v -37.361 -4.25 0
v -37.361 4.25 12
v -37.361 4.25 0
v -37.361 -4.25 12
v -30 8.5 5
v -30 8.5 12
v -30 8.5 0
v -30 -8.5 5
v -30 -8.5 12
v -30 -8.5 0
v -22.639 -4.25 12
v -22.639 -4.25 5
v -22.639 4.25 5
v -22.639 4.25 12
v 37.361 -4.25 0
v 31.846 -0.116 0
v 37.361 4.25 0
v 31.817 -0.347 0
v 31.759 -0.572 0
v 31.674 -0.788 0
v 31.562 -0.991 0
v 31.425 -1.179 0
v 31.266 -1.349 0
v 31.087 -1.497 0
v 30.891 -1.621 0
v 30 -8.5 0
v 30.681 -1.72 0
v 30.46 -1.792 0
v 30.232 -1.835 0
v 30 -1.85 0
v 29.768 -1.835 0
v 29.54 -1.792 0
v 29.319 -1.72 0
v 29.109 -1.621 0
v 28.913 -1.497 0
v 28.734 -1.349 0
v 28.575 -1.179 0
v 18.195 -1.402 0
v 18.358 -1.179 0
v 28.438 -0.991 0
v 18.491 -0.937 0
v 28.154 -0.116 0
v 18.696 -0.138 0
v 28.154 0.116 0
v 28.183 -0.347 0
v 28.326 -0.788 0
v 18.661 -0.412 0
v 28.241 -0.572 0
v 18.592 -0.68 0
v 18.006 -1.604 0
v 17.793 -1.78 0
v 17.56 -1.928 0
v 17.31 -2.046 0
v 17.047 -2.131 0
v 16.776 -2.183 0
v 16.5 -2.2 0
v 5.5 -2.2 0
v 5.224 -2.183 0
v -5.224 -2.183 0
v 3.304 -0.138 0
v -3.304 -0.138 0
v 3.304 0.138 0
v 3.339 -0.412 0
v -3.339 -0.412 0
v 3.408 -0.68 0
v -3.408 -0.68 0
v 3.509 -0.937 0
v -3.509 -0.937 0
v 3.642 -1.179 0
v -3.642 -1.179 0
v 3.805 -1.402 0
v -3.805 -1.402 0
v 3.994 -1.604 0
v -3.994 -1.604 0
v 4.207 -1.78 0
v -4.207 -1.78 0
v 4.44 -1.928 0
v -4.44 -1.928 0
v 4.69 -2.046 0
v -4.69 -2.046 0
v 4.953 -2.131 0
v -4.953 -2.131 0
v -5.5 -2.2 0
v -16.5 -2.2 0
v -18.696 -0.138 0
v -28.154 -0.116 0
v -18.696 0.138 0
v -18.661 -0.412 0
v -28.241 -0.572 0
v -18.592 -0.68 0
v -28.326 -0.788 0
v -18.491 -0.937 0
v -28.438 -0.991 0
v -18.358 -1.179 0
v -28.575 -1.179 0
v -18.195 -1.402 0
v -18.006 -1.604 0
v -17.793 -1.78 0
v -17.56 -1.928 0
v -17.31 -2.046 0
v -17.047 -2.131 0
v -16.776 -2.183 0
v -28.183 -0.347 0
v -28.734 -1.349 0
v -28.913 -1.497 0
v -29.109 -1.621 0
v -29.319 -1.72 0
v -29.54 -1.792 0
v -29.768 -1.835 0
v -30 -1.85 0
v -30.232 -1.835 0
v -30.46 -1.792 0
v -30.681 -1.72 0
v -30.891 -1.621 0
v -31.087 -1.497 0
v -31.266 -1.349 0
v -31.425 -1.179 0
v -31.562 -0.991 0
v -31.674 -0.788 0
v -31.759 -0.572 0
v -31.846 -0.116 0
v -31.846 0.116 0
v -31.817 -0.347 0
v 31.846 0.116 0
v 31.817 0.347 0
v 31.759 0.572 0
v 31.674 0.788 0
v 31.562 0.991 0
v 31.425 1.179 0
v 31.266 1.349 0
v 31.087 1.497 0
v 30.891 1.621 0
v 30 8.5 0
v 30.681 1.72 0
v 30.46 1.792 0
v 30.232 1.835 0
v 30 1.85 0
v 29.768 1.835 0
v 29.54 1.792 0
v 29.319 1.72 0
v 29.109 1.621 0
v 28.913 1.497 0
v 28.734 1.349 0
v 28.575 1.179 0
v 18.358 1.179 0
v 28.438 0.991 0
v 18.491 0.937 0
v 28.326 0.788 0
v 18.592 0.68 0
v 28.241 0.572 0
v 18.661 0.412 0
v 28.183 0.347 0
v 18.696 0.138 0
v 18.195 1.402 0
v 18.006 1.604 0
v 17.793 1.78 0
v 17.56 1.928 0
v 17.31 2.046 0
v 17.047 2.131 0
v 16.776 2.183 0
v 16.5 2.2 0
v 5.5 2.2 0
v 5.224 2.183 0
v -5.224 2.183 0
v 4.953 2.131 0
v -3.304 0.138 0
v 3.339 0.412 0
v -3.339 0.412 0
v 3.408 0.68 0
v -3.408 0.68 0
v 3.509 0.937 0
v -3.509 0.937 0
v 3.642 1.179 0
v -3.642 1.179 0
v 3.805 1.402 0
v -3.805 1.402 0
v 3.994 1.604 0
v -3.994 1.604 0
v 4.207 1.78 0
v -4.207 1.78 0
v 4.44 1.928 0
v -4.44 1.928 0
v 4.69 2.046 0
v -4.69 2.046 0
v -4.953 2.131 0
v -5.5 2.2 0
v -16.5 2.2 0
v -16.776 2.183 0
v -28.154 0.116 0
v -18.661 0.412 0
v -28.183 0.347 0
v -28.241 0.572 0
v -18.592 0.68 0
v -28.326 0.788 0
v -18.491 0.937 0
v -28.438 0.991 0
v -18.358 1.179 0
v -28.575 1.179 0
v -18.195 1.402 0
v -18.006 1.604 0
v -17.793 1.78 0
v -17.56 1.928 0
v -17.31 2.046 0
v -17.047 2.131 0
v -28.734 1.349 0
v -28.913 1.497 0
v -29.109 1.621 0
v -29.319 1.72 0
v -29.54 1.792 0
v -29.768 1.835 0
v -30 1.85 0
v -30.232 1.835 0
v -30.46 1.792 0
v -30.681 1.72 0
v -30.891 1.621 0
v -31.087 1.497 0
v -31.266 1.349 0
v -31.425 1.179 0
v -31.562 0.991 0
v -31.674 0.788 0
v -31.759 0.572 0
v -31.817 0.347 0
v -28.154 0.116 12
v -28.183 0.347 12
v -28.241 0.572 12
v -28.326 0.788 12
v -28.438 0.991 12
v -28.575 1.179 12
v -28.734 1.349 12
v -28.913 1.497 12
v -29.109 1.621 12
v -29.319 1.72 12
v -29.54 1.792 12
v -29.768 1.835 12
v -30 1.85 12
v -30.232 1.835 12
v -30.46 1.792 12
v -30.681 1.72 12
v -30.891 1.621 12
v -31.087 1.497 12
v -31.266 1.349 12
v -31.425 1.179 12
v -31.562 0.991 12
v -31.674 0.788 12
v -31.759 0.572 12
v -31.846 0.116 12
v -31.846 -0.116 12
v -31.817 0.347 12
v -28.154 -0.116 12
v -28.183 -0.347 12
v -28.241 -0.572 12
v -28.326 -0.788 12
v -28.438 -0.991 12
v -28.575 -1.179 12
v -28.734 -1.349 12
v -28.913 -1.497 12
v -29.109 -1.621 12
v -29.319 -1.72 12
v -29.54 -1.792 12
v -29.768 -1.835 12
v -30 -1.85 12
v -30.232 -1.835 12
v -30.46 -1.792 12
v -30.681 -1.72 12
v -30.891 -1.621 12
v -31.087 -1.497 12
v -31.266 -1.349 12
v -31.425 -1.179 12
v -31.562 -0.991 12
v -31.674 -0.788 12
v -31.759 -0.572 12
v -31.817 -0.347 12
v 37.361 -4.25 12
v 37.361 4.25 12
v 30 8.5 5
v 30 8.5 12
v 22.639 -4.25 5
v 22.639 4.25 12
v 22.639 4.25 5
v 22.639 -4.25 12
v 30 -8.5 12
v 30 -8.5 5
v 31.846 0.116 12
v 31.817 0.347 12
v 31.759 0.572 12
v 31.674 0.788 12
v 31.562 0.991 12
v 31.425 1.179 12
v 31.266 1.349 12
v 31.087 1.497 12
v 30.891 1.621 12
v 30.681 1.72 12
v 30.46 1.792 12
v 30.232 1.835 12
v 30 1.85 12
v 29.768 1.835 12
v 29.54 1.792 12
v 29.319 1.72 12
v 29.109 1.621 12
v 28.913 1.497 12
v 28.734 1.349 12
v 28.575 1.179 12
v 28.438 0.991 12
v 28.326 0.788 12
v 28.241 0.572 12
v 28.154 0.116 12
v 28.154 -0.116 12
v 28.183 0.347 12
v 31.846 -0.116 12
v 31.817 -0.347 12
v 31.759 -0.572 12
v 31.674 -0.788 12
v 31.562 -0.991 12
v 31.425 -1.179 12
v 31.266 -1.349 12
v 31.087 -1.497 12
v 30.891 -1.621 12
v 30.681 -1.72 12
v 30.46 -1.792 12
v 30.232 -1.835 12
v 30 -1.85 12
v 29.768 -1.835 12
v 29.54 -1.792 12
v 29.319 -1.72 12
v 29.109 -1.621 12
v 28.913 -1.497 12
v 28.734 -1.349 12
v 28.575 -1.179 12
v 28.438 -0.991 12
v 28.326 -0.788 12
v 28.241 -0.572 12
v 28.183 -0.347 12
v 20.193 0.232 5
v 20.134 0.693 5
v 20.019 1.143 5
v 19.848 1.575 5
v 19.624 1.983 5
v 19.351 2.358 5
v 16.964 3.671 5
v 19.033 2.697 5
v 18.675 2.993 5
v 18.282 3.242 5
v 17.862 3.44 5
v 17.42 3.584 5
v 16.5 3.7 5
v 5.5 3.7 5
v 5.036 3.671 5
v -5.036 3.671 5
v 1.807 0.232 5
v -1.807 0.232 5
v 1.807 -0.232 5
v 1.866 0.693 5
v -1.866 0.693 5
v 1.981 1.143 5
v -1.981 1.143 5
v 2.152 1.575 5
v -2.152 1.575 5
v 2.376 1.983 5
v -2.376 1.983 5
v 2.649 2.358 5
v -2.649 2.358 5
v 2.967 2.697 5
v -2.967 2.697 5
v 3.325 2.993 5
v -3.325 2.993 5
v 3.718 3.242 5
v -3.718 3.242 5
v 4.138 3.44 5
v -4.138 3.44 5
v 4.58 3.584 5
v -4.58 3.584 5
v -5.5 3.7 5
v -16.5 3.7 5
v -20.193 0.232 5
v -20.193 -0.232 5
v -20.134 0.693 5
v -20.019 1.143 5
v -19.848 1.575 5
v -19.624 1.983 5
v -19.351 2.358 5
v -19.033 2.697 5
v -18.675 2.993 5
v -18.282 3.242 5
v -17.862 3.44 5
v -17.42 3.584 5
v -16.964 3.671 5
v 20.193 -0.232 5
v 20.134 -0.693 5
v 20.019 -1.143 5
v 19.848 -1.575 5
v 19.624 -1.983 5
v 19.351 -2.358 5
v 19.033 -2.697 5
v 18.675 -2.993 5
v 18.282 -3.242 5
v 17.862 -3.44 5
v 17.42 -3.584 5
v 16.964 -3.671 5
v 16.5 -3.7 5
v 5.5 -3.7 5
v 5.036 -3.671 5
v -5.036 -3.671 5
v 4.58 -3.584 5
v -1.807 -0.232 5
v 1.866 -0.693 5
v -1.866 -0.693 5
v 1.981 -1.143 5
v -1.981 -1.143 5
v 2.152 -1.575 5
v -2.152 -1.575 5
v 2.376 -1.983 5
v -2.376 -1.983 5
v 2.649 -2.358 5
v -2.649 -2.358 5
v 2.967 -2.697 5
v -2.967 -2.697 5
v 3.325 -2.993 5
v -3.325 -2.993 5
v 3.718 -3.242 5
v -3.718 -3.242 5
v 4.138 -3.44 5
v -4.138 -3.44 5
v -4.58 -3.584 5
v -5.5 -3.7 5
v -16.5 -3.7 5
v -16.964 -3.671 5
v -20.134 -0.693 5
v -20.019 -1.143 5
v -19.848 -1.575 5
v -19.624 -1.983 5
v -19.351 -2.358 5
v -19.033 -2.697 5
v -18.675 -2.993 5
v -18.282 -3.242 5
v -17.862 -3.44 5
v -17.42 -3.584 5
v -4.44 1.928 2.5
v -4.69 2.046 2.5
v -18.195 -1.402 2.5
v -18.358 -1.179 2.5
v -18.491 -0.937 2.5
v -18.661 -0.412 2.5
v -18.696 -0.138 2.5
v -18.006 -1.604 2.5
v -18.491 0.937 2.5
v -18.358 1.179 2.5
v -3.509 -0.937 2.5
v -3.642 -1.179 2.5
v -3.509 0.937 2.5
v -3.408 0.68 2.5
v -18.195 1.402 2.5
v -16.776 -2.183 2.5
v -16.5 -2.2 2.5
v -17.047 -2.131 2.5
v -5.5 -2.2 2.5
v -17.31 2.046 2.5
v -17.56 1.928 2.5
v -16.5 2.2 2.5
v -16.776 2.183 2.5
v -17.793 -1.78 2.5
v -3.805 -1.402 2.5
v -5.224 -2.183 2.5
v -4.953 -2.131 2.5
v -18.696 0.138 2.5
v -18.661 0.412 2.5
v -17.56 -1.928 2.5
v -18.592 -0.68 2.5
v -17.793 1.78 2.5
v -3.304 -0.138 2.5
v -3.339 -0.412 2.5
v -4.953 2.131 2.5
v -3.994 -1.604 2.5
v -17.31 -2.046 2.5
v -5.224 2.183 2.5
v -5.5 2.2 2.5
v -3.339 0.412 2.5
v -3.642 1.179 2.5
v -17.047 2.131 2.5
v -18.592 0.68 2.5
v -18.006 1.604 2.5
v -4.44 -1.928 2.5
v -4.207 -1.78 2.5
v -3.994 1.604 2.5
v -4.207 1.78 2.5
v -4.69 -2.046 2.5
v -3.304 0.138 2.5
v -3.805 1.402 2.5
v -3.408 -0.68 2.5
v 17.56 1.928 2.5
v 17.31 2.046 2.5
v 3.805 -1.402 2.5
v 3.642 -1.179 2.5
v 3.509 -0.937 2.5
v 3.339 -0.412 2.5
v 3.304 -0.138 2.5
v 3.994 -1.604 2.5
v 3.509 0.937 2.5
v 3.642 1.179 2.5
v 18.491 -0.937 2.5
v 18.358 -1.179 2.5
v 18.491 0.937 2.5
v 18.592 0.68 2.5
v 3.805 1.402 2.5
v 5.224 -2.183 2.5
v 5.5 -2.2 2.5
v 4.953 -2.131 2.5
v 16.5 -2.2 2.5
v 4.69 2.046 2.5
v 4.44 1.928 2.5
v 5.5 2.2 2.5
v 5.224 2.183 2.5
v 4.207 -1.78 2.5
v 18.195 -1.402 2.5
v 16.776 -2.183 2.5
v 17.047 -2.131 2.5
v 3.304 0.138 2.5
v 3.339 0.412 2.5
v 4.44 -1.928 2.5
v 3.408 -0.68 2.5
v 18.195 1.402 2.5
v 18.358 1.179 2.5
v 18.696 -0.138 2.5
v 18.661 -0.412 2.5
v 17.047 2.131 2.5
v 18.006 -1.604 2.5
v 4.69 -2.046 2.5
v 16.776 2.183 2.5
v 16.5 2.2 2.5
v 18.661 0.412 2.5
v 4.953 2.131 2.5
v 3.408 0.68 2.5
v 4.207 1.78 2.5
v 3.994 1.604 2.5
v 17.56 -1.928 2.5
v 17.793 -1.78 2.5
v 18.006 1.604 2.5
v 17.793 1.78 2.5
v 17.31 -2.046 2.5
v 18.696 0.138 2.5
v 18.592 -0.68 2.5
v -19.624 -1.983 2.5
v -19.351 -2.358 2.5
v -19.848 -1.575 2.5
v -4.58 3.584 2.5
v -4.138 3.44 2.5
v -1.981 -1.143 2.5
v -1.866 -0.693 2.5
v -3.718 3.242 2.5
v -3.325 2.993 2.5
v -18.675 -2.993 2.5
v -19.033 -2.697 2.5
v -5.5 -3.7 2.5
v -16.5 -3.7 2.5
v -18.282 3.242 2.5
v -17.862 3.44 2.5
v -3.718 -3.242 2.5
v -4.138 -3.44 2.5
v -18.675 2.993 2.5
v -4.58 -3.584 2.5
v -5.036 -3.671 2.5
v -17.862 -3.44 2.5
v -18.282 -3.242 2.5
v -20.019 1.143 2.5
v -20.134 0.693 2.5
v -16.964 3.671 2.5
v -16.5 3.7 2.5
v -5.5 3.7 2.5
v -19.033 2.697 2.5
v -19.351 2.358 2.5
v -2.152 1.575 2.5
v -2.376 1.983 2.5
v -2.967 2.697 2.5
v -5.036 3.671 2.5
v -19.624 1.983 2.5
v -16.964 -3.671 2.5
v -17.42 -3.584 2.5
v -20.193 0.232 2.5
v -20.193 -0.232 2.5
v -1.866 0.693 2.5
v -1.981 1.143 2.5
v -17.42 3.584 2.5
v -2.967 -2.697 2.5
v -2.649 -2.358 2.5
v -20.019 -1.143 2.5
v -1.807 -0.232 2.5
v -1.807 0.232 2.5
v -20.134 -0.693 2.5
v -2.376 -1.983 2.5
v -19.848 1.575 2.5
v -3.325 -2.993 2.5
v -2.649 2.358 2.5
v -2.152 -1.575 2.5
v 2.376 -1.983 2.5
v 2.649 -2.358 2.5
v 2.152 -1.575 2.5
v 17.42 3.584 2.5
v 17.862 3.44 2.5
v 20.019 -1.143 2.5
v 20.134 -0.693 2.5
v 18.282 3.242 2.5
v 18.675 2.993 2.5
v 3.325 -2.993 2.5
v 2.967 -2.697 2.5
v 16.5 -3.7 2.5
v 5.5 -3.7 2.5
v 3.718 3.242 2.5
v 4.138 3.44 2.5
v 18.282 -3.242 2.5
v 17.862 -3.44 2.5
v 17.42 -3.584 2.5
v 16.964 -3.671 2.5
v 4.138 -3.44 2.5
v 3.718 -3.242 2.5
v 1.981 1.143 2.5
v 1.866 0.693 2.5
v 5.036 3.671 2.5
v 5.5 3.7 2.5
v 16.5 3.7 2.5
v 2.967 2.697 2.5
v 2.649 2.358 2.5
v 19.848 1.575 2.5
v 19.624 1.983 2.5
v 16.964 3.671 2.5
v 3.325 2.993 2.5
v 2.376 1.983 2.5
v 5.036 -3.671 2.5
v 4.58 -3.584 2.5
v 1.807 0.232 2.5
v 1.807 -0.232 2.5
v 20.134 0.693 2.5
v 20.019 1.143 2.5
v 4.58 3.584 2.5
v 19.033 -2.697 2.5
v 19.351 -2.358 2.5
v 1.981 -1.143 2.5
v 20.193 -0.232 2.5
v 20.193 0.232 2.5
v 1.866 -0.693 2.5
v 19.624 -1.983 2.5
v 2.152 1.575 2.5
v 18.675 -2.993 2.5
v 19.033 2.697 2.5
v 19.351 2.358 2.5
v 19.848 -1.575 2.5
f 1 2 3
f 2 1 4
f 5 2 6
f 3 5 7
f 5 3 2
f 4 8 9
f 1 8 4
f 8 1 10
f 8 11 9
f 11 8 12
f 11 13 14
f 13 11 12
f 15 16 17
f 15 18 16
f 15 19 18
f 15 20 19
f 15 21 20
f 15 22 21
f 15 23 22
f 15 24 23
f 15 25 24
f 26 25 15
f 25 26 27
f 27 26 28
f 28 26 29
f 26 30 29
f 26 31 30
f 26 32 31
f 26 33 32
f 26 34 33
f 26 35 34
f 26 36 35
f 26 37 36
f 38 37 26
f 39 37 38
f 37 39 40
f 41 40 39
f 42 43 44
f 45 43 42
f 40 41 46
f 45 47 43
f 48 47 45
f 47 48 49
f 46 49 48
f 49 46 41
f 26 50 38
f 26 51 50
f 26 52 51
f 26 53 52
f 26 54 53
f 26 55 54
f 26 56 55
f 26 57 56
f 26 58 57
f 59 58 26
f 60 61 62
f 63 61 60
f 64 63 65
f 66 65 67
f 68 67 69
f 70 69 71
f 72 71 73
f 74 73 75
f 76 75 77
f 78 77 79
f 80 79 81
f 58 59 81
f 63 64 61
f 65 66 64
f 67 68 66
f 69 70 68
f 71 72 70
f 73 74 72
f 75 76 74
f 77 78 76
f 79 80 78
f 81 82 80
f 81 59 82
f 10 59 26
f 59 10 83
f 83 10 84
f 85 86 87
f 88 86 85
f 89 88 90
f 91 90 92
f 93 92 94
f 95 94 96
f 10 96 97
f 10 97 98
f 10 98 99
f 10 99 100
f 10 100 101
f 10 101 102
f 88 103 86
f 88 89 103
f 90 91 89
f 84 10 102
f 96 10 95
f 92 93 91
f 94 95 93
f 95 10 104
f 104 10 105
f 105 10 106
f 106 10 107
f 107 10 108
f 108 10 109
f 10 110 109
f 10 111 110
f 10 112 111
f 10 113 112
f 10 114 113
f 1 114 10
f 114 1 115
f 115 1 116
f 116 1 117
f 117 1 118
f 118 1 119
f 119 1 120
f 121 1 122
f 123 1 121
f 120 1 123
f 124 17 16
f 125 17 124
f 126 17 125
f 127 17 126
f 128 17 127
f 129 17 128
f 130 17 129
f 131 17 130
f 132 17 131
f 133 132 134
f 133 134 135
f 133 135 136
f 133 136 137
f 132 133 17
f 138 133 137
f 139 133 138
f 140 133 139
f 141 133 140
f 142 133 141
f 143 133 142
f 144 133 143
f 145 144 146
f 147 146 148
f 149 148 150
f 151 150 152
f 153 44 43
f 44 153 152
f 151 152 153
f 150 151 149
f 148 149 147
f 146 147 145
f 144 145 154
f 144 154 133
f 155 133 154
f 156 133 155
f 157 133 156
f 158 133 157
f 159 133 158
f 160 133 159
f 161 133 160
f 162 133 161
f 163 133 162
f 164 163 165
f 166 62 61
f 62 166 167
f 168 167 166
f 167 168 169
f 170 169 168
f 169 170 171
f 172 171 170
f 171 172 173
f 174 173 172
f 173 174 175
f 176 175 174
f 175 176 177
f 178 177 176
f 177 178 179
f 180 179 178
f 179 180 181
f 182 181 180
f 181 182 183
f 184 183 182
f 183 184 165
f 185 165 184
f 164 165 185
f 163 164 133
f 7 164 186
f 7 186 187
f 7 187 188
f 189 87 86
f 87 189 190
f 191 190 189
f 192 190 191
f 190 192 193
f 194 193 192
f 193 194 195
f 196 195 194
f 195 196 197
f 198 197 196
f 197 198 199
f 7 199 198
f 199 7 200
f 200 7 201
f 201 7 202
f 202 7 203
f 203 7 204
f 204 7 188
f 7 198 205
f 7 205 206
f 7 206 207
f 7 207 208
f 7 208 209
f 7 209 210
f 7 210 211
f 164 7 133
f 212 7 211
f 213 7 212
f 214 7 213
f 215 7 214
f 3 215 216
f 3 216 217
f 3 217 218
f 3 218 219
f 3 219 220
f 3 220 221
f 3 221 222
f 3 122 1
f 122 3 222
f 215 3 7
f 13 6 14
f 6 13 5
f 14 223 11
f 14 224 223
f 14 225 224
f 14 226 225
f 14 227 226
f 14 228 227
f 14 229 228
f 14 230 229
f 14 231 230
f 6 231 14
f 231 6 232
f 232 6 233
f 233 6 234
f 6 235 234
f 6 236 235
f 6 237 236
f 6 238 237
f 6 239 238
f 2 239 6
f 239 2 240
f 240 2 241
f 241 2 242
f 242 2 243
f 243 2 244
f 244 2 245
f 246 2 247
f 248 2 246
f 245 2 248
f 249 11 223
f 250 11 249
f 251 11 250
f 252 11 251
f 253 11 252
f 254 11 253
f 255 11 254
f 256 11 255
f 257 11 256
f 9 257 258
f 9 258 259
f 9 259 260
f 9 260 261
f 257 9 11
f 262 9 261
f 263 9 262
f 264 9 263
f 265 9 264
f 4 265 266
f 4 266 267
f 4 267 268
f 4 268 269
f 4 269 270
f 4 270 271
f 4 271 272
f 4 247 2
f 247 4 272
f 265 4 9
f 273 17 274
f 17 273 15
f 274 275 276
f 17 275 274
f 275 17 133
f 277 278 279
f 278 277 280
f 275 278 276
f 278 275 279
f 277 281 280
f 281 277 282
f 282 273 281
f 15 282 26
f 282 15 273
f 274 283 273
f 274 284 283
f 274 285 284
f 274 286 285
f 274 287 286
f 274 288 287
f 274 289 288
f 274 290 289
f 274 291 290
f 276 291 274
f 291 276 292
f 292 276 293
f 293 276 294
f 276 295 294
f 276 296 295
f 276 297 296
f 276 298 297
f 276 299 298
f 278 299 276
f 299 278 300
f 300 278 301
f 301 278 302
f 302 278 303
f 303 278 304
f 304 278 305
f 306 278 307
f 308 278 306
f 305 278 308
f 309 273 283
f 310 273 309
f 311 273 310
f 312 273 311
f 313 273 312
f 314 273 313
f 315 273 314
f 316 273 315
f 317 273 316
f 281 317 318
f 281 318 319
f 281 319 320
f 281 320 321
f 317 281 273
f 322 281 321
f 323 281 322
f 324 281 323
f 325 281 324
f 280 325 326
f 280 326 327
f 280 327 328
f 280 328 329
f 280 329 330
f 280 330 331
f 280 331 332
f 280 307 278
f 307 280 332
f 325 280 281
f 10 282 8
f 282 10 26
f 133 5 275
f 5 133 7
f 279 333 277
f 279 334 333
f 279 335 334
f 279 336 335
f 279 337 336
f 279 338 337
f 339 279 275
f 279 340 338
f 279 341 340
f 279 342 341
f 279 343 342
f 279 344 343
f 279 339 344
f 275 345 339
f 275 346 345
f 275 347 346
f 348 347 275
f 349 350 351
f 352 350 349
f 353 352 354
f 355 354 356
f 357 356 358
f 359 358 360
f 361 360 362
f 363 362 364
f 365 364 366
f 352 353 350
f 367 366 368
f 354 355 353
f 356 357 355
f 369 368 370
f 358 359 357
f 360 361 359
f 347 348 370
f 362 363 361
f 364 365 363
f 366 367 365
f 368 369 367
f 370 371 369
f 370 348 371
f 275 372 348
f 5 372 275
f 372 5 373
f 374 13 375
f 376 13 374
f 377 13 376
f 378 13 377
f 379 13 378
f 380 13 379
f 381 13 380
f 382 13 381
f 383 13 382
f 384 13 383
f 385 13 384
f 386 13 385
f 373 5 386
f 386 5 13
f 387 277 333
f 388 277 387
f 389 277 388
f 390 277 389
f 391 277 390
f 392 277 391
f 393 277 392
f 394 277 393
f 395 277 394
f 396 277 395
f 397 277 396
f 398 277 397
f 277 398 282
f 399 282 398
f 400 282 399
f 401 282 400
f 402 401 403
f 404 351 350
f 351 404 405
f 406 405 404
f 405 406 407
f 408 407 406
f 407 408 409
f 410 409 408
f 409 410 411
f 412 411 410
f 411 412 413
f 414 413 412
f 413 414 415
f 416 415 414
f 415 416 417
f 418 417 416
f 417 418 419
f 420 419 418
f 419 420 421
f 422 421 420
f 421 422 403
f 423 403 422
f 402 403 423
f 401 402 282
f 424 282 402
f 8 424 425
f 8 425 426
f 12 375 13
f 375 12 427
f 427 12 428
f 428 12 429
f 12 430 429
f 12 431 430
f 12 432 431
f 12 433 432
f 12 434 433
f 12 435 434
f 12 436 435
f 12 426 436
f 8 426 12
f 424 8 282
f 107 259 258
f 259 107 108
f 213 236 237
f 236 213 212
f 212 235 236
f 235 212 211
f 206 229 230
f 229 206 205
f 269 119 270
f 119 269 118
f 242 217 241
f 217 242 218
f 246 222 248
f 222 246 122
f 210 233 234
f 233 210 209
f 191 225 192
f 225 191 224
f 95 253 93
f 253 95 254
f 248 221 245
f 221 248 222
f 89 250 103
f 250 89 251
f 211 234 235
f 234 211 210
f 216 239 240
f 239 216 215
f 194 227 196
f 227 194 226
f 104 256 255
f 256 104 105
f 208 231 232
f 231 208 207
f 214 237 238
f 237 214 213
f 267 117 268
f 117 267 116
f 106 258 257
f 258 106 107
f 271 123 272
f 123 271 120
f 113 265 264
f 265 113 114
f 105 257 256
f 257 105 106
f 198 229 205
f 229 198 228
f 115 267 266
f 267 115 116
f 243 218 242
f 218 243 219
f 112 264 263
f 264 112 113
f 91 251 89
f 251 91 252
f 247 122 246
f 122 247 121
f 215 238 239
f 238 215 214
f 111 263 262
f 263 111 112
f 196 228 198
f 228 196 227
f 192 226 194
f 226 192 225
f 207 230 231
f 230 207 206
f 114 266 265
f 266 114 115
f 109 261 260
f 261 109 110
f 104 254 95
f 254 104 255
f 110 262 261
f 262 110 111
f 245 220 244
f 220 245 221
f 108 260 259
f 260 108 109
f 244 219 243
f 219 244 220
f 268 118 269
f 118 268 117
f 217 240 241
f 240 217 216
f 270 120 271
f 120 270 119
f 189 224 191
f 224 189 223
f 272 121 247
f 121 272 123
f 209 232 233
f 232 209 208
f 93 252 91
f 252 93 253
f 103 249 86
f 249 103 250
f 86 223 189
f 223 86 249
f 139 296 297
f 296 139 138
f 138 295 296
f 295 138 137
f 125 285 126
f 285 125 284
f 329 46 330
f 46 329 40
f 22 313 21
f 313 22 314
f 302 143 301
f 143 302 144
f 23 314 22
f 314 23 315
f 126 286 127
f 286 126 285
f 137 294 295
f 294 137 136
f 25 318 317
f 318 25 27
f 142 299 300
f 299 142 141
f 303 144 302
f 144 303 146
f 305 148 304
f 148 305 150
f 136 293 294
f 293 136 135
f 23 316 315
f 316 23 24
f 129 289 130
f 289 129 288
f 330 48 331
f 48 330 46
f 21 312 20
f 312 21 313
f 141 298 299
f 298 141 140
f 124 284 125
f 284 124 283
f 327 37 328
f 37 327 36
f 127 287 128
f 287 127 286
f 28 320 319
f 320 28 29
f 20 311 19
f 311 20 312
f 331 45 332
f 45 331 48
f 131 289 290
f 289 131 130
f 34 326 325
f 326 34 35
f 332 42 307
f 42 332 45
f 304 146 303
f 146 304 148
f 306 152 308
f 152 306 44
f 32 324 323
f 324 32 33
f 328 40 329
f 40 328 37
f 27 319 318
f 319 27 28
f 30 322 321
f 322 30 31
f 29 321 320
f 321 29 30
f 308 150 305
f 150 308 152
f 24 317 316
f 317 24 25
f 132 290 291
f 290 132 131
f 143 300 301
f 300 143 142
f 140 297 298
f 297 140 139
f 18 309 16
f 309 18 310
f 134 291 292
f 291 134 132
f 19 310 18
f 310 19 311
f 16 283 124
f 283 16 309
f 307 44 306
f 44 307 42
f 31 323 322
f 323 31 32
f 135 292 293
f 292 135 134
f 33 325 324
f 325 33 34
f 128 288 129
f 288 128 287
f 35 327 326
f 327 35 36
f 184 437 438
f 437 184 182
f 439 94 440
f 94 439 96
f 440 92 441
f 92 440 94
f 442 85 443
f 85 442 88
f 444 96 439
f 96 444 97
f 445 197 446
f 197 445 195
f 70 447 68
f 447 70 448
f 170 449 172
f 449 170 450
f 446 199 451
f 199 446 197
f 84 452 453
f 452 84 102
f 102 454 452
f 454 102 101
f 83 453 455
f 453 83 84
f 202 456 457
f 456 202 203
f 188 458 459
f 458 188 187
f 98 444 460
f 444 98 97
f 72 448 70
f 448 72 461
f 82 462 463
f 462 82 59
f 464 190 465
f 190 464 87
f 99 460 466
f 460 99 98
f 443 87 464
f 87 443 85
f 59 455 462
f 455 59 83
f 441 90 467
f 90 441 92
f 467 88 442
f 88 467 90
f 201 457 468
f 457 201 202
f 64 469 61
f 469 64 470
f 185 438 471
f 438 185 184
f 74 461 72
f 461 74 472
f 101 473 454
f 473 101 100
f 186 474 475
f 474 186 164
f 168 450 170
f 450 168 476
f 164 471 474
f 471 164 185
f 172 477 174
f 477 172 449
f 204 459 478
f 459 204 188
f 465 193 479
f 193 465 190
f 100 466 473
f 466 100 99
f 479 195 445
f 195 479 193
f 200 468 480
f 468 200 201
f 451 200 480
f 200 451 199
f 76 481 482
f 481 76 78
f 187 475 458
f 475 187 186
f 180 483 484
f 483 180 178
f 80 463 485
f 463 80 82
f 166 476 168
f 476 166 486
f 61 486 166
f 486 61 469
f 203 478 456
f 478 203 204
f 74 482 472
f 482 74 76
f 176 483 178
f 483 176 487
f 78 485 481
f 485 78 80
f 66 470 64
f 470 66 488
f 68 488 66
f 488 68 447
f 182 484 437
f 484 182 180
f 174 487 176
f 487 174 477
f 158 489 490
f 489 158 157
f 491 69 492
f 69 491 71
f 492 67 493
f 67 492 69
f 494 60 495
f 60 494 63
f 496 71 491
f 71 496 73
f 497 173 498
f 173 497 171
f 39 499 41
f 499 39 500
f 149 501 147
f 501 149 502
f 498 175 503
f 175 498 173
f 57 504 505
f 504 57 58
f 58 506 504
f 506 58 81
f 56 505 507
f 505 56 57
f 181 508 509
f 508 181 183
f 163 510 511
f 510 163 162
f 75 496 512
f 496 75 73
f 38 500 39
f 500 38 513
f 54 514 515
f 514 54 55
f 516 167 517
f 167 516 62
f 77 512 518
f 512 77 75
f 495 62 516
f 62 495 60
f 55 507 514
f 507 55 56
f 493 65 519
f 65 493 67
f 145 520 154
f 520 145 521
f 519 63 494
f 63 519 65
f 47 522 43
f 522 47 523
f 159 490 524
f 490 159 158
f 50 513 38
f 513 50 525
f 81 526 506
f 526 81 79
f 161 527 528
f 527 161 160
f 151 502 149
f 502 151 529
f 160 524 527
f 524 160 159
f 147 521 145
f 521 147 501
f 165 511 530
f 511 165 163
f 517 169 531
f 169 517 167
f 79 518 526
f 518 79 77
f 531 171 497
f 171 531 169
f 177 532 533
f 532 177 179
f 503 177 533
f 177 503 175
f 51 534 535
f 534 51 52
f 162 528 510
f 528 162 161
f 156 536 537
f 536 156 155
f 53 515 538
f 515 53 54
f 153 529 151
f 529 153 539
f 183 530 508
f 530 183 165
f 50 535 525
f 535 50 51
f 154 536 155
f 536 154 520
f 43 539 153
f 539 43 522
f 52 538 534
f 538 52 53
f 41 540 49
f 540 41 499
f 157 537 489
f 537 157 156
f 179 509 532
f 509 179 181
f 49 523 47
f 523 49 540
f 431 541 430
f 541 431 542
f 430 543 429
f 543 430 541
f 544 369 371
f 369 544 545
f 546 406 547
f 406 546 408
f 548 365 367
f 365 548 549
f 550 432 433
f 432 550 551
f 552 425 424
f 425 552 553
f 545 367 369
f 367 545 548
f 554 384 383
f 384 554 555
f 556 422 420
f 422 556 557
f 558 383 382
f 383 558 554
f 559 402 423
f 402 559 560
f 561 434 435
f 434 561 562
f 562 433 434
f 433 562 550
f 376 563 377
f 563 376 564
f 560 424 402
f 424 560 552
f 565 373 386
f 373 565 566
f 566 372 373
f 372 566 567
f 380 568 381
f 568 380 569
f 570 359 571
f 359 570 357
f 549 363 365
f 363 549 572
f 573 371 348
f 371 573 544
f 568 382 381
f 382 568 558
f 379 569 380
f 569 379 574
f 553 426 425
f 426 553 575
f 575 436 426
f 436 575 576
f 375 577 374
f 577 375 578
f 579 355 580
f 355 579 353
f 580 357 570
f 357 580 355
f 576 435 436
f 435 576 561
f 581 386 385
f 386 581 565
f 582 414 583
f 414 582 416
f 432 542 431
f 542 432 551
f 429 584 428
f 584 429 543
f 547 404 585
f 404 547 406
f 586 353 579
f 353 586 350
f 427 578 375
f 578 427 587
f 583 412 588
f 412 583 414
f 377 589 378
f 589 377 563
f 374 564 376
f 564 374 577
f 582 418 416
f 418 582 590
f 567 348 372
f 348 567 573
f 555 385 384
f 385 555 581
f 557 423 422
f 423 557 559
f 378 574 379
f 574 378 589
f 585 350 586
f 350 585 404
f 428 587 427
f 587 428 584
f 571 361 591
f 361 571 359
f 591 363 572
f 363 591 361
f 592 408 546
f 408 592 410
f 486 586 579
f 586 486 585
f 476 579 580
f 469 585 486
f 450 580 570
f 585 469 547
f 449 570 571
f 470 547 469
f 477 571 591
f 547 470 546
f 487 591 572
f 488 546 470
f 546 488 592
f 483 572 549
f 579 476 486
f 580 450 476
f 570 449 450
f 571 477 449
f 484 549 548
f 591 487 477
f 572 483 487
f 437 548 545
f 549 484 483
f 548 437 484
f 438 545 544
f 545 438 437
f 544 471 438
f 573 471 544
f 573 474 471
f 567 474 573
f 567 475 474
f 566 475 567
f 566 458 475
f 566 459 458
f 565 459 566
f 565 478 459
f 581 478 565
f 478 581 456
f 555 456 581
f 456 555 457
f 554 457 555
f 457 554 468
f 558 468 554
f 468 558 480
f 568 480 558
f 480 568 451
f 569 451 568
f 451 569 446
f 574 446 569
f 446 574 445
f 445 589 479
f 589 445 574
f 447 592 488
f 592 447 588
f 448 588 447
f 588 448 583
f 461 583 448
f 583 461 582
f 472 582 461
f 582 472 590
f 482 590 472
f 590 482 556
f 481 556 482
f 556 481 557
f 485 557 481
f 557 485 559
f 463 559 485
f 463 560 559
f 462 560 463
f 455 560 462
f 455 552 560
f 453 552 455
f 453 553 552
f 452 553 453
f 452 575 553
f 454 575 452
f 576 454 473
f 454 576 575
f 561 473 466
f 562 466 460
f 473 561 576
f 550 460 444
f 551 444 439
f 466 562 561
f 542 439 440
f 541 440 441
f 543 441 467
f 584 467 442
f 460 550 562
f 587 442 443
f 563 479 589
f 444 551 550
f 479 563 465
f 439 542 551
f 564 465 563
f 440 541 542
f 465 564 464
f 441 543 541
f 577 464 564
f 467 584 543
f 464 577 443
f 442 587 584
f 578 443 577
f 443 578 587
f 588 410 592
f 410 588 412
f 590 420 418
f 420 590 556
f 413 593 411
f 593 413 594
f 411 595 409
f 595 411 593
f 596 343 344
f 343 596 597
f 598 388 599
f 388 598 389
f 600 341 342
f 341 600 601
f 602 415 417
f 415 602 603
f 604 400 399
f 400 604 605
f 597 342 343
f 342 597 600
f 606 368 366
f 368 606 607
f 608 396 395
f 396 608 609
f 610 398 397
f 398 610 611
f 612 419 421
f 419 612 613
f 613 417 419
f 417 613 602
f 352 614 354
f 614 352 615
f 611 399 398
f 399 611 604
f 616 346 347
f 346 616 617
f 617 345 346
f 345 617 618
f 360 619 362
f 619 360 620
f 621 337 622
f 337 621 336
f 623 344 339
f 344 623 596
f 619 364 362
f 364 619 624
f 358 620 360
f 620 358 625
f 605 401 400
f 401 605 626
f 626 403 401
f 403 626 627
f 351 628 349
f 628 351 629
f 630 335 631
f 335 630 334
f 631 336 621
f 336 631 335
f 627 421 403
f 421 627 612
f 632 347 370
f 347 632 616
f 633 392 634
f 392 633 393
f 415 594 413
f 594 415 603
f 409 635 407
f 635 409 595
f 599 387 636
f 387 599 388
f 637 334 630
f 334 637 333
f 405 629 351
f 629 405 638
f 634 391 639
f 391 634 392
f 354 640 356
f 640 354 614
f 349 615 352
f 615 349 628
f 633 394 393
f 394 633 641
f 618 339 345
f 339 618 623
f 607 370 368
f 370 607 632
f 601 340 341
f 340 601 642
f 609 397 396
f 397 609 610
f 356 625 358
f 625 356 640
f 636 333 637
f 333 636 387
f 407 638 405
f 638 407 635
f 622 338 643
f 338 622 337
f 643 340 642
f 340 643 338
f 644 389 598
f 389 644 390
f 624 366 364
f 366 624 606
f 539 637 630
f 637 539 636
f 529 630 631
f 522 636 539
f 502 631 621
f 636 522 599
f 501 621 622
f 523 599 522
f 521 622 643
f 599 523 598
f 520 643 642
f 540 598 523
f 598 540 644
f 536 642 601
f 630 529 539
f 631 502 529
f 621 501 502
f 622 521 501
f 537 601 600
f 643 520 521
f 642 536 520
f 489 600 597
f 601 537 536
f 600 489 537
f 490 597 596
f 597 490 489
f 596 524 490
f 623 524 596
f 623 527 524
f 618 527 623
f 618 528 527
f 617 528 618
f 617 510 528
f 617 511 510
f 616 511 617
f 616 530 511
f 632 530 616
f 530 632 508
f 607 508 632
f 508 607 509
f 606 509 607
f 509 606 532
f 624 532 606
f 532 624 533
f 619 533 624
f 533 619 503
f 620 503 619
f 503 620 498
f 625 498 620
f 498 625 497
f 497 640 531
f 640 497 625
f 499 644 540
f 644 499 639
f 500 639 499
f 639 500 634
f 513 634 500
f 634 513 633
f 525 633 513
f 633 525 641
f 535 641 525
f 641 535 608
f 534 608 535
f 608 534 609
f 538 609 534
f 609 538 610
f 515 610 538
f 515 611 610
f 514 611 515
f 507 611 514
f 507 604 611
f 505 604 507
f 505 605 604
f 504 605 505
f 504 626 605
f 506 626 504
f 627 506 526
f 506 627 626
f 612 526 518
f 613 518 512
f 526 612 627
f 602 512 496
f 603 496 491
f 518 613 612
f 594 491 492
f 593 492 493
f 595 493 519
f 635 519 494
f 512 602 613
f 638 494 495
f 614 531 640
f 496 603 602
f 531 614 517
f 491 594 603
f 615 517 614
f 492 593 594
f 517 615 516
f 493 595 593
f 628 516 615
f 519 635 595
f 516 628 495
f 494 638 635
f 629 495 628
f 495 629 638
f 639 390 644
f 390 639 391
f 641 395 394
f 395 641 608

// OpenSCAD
// file: servo mount.scad
use <myshapes.scad>
 
 /*
		 9g servo mount . m2 inserts
 */
 
 w = 22.5 + 2; 
 x = 12 + .6; 
 y = 33;
z = 8;
c = 9;
p = 4;

  hd = 28;
  
    h2 = 3; 
    h3 = 3.1;
    h2i = 3.6; 
    h3i = 5.2; 

fn = 150;

//%cy(110, 1, 50);  
 
//sidemount();

//rotate([-90,0,0])

//smnt();
//mn2();

//arm(24);
tmnt();

//mn();

//piv();

//lg();
//    difference(){
//arm(24);
//          translate([0,  12, 4])   cy(7, 4, fn);
//        
//          translate([0,  12, 1])   cy(3.4, 4, fn);
//          translate([0,  0, 4])   c(3, 14, 4);
//    }

                     
//             for(j=[-1, 1])   
//                 for(i=[ -1, 1])  translate([35*i,j*32, 12])  rotate([ 90 , 0, 0])
//                 mirror([0, 0, j==-1?0:1]) {
////          translate([25*i,0, 6])  mnt();
//                  translate([ 15*i, 28, -2])     rotate([ 0 , 0, 90+10*i]) arm(20);
//                        translate([ 25*i, 30, -6])       lg();
//                 }
//
//        for(i=[-1, 1])  translate([35*i , 0, 10]) 
//fr();
//               translate([35, 0, 2]) 
//  rotate([ 0 , 90, 0])   
//hinge();

          
module fr(){
             for(j=[-1, 1])   
                 for(i=[ 0])  translate([35*i,j*36, 12])  rotate([ 90 , 0, 0])
                 mirror([0, 0, j==1?0:1]) {
          translate([25*i,0, 6])  mnt();
                 }
    difference(){
        union(){
        hull(){
            for(i=[-1, 1])  translate([-2, 18*i , 0])  holes(24, 4, 46, 6);
        }
        
//          translate([40,0, 14])   rotate([ 90 , 0, -90]) mnt(5);
        hull(){
               translate([38, 0, 2])    rc(4, 44, 4, 3);
               translate([28, 0, 2])    rc(4, 52, 4, 3);
        }
    }
   translate([35, 0, 2])   hb();
           
               translate([38-2, 0, -1])  rotate([ 0 , 0, 90])  holes(3.5, 11, 15);
            for(i=[-1:1])  translate([0, 16*i , -10])  holes(3.1, 44, 62);
                
           for(i=[0:5])   rotate([ 0 , 0, i*60]) translate([0, 19   , -1]) cy(20, 11, 6);
          translate([0,  0, 0])  cy(20, 11, 6);
    }
    
}

module hinge(){
    difference(){
    union(){   
   translate([.25, 0, 0])  rotate([ 0 , 0, 90])     slot(6, 11 ,20);
            
    hb(.5);
    }
               translate([1, 0, -1])  rotate([ 0 , 0, 90])  holes(3.1, 11, 15);
          translate([-4,  0, 0])  cy(3.1, 11, fn);
    
   translate([-5, 0, 8])  rotate([ 90 , 0, 90])     slot(2.5, 11, 19);
   translate([-9.5, 0, 8])  rotate([ 90 , 0, 90])     slot(3.6, 11, 19);
    }
}

module hb(v=0){
    
   hull(){
          translate([-4,  0, 2])  rotate([ 0 , 0, 30])   cy(7-v, 4, 6);
            
   translate([0, 0, 0])    rotate([ 0 , 0, 90])   slot(7-v/2, 4, 20);
   }
   }

module mnt(yy = 0){ 
	difference(){
        union(){
            hull(){
//               translate([0, -10.5, p/2])    rc(38, 3,p, 2);
               translate([ 0, 0, p/2])    rc(38+yy, x+3, p, 2);
                  for(i=[-1,1])  translate([ i*25, 0, p/2]) rotate([0,0,90])  cy(c, p, 6); 
                  } 
        }    
                    for(i=[-1,1])  translate([ i*25, 0, c/2])  cy(h3, w, fn); 
            translate([ yy, 0, p])   servo();
//            translate([ -yy*3.3, -1, -1])  rotate([0,0,90])  slot(4, 9, 8);
    } 
}

module lg(){
    d = 4;
    l = 60;
    difference(){
        union(){  
                for(i=[-1, 0, 2])  translate([ 0, i*l/3 , d/2])   cy(  c+2    , d, 6);  
                    
      
          translate([0,l/3/2, d/2]) c(6, l*1, d);
        }
        difference(){
          translate([0,l/6, d]) c(3, l*.8, d);
          translate([0,0, d]) cy(c+5, d, 6);
        }
        
                for(i=[-1, 0, 2])  translate([ 0, i*l/3 , d/4])   cy(  3.1    , d*2, fn);  
                for(i=[-1, 2])  translate([ 0, i*l/3 , d])   cy(  7    , d, fn);   
    }  
}



module mn2(){ 
    of = 13;
    oo = 19;
	difference(){
        union(){
            hull(){
               translate([ of, oo+5, p/2])    cy(11, p, fn);
               translate([ 0, 0, p/2])    rc(38, x+3, p, 2);
//                  for(i=[-1,1])  translate([ i*25, 0, p/2]) cy(c, p, fn); 
                  } 
        }    
                    for(i=[-1,1])  translate([ of , oo + i*5, c/2])  cy(h3, w, fn); 
                    for(i=[-1,1])  translate([ of , oo+ i*5, w/2+2.5])  cy(8, w, fn); 
//                    for(i=[-1,1])  translate([ i*25, 0, c/2])  cy(h3, w, fn); 
            translate([ 0, 0, 5])   servo();
    } 
}




module tmnt(){ 
	difference(){
        union(){
               translate([ 0, 0, p/2])    rc(38, x+3, p, 2);
            hull(){
               translate([ 20, 0, p/2])    rc(8, x+3, p, 2);
                  for(i=[-1,1])  translate([ 35,i*5,  p/2]) cy(11, p, 6); 
                  }    
                  translate([ -23, 0, p])   cy(11, p*2, 6);
                  translate([ 23, 0, p/2+1])   cy(11, p+2, 6);
        }    
//               translate([ -22, 0, p/2])   cy(h3, p*3, fn);
        holes(h3, p*3, 46);
        
                    for(i=[-1,1])  translate([ 35,i*5,  p/2])  cy(h3, w, fn); 
                    for(i=[-1,1])  translate([ 35,i*5,  w/2+ 2])  cy(8, w, fn); 
            translate([ 0, 0, p ])   servo();
    } 
}


module piv(){
          translate([0,7.5, 0]) 
        arm(15);
          translate([15,0, 0]) 
        rotate([0,0,90])
        arm(30); 

        rotate([0,0,60])
        translate([10,-7,2]) c(2,24, 4);  
}

module arm(l, d=4){  
	difference(){
		union(){ 
                for(i=[-1,1])  translate([ 0, i*l/2 , d/2])   cy(  c+2    , d, 6);  
                translate([0,0,d/2]) rc(5, l, d, 2);  
		} 
				for(i=[-1,1])  translate([ 0, i*l/2 , d/2])   cy(  h3- (i==-1 ? 1.1:0) , d*2, fn);   //   
	}
}    

module mn(){ 
	difference(){
        union(){
            hull(){
               translate([ 0, 22, p/2])    rc(22, x, p, x-1 );
               translate([ 0, 0, p/2])    rc(38, x+3, p, 2);
//                  for(i=[-1,1])  translate([ i*25, 0, p/2]) cy(c, p, fn); 
                  } 
        }    
                    for(i=[-1,1])  translate([ i*5, 22, c/2])  cy(h3, w, fn); 
                    for(i=[-1,1])  translate([ i*5, 22, w/2+2.5])  cy(8, w, fn); 
//                    for(i=[-1,1])  translate([ i*25, 0, c/2])  cy(h3, w, fn); 
            translate([ 0, 0, 5])   servo();
    } 
}


module smnt(){ 
	difference(){
        union(){
            hull(){
               translate([ 0, 0, z/2])    rc(38, x+4, z, 2);
                  for(i=[-1,1])  translate([ i*25, x/4+2, c/2]) rotate([90,0,0])  cy(c, x/2, fn); 
                  } 
        }    
                    for(i=[-1,1])  translate([ i*25, 0, c/2]) rotate([90,0,0])   cy(h3, w, fn); 
                    for(i=[-1,1])  translate([ i*25, 4-w/2, c/2]) rotate([90,0,0])   cy(6, w, fn); 
            translate([ 0, 0, 7])   servo();
    } 
}
 

module sidemount(){ 
	difference(){
        union(){
               translate([ 0, 0, x/2])    rc(38, x+2, x, 2);
            hull(){
                  for(i=[-1,1])  translate([ i*25, 0, z/2]) cy(c, z, fn); 
                  } 
        }    
                    for(i=[-1,1])  translate([ i*25, 0, c/2])  cy(h3, w, fn); 
            translate([ 0, -7, 8])   rotate([90,0,0])  servo();
    } 
}


module servo(){
        union(){
                  for(i=[-1,1])  translate([ i*hd/2, 0, 0])  cy(h2i, w, fn); 
                  translate([ 0, 0, 0])    rc(y, x, 3, 2);
 
                  translate([ 0, 0, z])    rc(w, x, w, 2);	 
        } 
}

 
 

  


	
	
// file: myshapes.scad
 /*
  * Copyright [2017] [Saul Castro]

    Licensed under the Apache License, Version 2.0 (the "License");
    you may not use this file except in compliance with the License.
    You may obtain a copy of the License at
    
        http://www.apache.org/licenses/LICENSE-2.0
    
    Unless required by applicable law or agreed to in writing, software
    distributed under the License is distributed on an "AS IS" BASIS,
    WITHOUT WARRANTIES OR CONDITIONS OF ANY KIND, either express or implied.
    See the License for the specific language governing permissions and
    limitations under the License.

  */
  
  
/*==================================================
==================	Extention of basic shape with shot sintax =====================
==================================================*/
//all shapes centered at 0, 0 for easy rotation

// r prefix rounded
//rrc(10, 20 ,30, 4, 5);
//sp(11, 44);

fn = 50;

module c(w, l, d){
    translate([0,0,0]) cube([w, l, d], center=true);
}

module cy(d, h){  
    translate([0,0,0])    cylinder(d=d, h=h, $fn=fn, center=true);
}
module cy(d, h, f){  
    translate([0,0,0])    cylinder(d=d, h=h, $fn=f, center=true);
}

module sp(d, f){  
    translate([0,0,0])    sphere(d=d, $fn=f);
}

module rcy(d, h, c, fn){
	minkowski(){
			sp(c);
			cy(d-c, h-c, fn);
        }
}

module rc(w, l, d, c){
    hull(){
            translate([w/2-c/2,l/2-c/2,0]) cy(c, d);
            translate([w/2-c/2,-l/2+c/2,0]) cy(c, d);
            translate([-(w/2-c/2),l/2-c/2,0]) cy(c, d);
            translate([-(w/2-c/2),-l/2+c/2,0]) cy(c, d);
    }
    
}

module rrc(w, h, d, c, s){
          translate([0,0,0])  minkowski(){
			sp(s);
			rc(w-s, h-s, d-s, c);
        }
}



module slot(d, h, l){
    hull(){
        holes(d, h, l);
    } 
}

module cn(d, d2, h ,h2  , ff = fn ){ 
         rotate([0,0,90])  hull(){ 
                 translate([ 0, 0, h/2])   cy(d2, h, ff);  
                 translate([ 0, 0, h2/2])  cy(d, h2, ff); 
          }
}
                   

  
module cs(d, d2, h, x ){
    
                  for(i=[-1,1])  translate([ i*x/2, 0, 0])  cn(d, d2, h/3, h);
}

module holes(d, h, x, ff = fn){
    
                  for(i=[-1,1])  translate([ i*x/2, 0, h/2])  rotate([0,0,90]) cy(d, h, ff); 
}
                   
  
// main file
use <myshapes.scad>
 use <servo mount.scad>
 
 /*
		 9g servo mount . m2 inserts
 */
  
z =4;
c = 9;
p = 5;

  hd = 28;
  
    h2 = 2.2; 
    h3 = 3.2;
    
      x = 42;
         y = 22;

fn = 150;

//%cy(110, 1, 50);  
  
// !arm(24); 

//parm(60, 15);

//tmnt();

//frame();
//  
// translate([30, -55, -z])    rotate([ 0 , 0, 90]) tmnt();
// translate([38, -70, -z*3])    rotate([ 0 , 0, -130]) arm(20);
// translate([53, -77, -z*2])    rotate([ 0 , 0, 90]) arm(46);
// 
// translate([20, -41, -z*2])    rotate([ 0 , 0, -90]) arm(20);

//darm(90, 20);

//base();
space();
module space(){
    s = 12;
	difference(){
		union(){  
//            hull() for(i=[-1,1])  translate([0, i*y/2, 0])  holes(11, p, x, 6); 
               translate([0, 0, 0])  holes(17, s, 60, 6); 
              hull() translate([0, 0, 0])  holes(17, p, 60, 6); 
            }
               translate([0, 0, -1])  holes(h3+.5, s*2, 60); 
            
             for(i=[-1,1])  translate([i*11, 0, 0])  slot(4.4, s, 11);
             for(i=[-1,1])  translate([i*11, 0, p/2])  slot(7.4, s, 11);
    }
}

module base(){
    
	difference(){
		union(){  
            hull() for(i=[-1,1])  translate([0, i*y/2, 0])  holes(11, p, x, 6); 
                
             translate([0, y/2, 4])  cy(11, 8, 6);
               translate([0, 0, 0])  holes(17, p, 60, 6); 
//              translate([0, 0, 0]) rotate([0,0,90])  holes(11, p, y, 6);  
//             translate([0, 0, p/2])  rc(x+11, y+11, p, p);
		}    
             for(i=[-1,1])  translate([0, i*y/2, 0])    holes(h3, p*2, x, fn);  
              translate([0, 0, 0]) rotate([0,0,90])  holes(h3, p*2, y, fn);  
               translate([0, 0, -1])  holes(y, p*2, 24, 6); 
               translate([0, 0, -1])  holes(h3+.5, p*2, 60); 
	} 
}

module darm(l, o){
      
	difference(){
		union(){ 
             holes(11, p, l, 6);
             holes(11, p, l-o*2, 6); 
              translate([0, 0, p/2])  c(l, 6, p);
		}   
            translate([0, 0, p/2]) slot(3, p, l/2-9);
           for(i=[-1,1])  translate([i*(l/2-o/2-1), 0, p/2]) slot(3, p, 7);
         
              translate([0, 0, -1])   holes(h3, p*2, l-o*2, fn);
//              translate([0, 0, p/2])   holes(7, p, l-o*2, fn);
              translate([0, 0, -1])   holes(h3+.4, p*2, l, fn);
              translate([0, 0, p/2])   holes(7, p, l, fn);
	} 
}

module parm(l, o){
      
	difference(){
		union(){ 
             holes(11, p, l, 6);
              translate([ l/2-o, 0, p/2]) rotate([0,0,90])   cy(11, p, 6);
              translate([0, 0, p/2])  c(l, 6, p);
		}   
            translate([-o/2, 0, p/2]) slot(3, p, l/2);
        
              translate([ l/2-o, 0, p]) cy(7, p, fn);
              translate([ l/2-o, 0, p/2]) cy(h3, p*2, fn);
              translate([0, 0, -1])   holes(h3, p*2, l, fn);
              translate([0, 0, p/2])   holes(7, p, l, fn);
	} 
}


module frame(){ 
    union(){
	difference(){
        union(){ 
                  translate([0, 0, z/2])    rotate([ 0 , 0, 0])  cy(40, z, 6);

        translate([0, 17.25, 12])    rotate([ 90 , 0, 0]) mnt();
        }     
          translate([ 0, 20, 12])    rotate([ 90 , 0, 0])  holes(4., z*2, 50);
                  translate([0, 0, z/2])    rotate([ 0 , 0, 0])  cy(30, z*2, 6);
        
    }
        translate([0, -25, 0])    rotate([ 0 , 0, 180]) mnt(); 
       
             translate([0, 15.25, 0])  hull(){
           
             translate([0, 0, z/2])   c(26, z, z);
             translate([0, 0, z+1])  c(40, z, 1);
        }
//          translate([ 0, 20, 12])    rotate([ 90 , 0, 0])  holes(5.1, z*2, 50);
        
//          translate([ 0, 0, -1])    rotate([ 0 , 0, 90])  holes(3.1, z*2, 20, fn);
//          translate([ 0, 0, z/2])    rotate([ 0 , 0, 90])  holes(7, z, 20, 6);
//           for(i=[-1,1])   translate([11*i, 0, z/2])    rotate([ 0 , 0, 90])  cy(22, z*2, 6);
    } 
}
 
 

module arm(l, d=4){  
    c = 6;
	difference(){
		union(){ 
                for(i=[-1,1])  translate([ 0, i*l/2 , d/2])   cy(  c +i+1   , d, 6);  
                translate([0,0,d/2]) rc(d+.4, l, d, 2);  
//                translate([ 0, -l/2 , d])   cy(  c  , d*2, 6);  
		} 
                translate([0,0,-d/2]) hull() rotate([0,0,90]) holes(2, d*2, l*.6, 6);
				for(i=[-1,1])  translate([ 0, i*l/2 , d/2])   cy(   (i==-1 ? 1.8:h2+.5) , d*4, fn);   
                    translate([ 0, l/2 , d+1])   cy(  4.5  , d, fn);  
	}
}    




 
 

  


	
	
